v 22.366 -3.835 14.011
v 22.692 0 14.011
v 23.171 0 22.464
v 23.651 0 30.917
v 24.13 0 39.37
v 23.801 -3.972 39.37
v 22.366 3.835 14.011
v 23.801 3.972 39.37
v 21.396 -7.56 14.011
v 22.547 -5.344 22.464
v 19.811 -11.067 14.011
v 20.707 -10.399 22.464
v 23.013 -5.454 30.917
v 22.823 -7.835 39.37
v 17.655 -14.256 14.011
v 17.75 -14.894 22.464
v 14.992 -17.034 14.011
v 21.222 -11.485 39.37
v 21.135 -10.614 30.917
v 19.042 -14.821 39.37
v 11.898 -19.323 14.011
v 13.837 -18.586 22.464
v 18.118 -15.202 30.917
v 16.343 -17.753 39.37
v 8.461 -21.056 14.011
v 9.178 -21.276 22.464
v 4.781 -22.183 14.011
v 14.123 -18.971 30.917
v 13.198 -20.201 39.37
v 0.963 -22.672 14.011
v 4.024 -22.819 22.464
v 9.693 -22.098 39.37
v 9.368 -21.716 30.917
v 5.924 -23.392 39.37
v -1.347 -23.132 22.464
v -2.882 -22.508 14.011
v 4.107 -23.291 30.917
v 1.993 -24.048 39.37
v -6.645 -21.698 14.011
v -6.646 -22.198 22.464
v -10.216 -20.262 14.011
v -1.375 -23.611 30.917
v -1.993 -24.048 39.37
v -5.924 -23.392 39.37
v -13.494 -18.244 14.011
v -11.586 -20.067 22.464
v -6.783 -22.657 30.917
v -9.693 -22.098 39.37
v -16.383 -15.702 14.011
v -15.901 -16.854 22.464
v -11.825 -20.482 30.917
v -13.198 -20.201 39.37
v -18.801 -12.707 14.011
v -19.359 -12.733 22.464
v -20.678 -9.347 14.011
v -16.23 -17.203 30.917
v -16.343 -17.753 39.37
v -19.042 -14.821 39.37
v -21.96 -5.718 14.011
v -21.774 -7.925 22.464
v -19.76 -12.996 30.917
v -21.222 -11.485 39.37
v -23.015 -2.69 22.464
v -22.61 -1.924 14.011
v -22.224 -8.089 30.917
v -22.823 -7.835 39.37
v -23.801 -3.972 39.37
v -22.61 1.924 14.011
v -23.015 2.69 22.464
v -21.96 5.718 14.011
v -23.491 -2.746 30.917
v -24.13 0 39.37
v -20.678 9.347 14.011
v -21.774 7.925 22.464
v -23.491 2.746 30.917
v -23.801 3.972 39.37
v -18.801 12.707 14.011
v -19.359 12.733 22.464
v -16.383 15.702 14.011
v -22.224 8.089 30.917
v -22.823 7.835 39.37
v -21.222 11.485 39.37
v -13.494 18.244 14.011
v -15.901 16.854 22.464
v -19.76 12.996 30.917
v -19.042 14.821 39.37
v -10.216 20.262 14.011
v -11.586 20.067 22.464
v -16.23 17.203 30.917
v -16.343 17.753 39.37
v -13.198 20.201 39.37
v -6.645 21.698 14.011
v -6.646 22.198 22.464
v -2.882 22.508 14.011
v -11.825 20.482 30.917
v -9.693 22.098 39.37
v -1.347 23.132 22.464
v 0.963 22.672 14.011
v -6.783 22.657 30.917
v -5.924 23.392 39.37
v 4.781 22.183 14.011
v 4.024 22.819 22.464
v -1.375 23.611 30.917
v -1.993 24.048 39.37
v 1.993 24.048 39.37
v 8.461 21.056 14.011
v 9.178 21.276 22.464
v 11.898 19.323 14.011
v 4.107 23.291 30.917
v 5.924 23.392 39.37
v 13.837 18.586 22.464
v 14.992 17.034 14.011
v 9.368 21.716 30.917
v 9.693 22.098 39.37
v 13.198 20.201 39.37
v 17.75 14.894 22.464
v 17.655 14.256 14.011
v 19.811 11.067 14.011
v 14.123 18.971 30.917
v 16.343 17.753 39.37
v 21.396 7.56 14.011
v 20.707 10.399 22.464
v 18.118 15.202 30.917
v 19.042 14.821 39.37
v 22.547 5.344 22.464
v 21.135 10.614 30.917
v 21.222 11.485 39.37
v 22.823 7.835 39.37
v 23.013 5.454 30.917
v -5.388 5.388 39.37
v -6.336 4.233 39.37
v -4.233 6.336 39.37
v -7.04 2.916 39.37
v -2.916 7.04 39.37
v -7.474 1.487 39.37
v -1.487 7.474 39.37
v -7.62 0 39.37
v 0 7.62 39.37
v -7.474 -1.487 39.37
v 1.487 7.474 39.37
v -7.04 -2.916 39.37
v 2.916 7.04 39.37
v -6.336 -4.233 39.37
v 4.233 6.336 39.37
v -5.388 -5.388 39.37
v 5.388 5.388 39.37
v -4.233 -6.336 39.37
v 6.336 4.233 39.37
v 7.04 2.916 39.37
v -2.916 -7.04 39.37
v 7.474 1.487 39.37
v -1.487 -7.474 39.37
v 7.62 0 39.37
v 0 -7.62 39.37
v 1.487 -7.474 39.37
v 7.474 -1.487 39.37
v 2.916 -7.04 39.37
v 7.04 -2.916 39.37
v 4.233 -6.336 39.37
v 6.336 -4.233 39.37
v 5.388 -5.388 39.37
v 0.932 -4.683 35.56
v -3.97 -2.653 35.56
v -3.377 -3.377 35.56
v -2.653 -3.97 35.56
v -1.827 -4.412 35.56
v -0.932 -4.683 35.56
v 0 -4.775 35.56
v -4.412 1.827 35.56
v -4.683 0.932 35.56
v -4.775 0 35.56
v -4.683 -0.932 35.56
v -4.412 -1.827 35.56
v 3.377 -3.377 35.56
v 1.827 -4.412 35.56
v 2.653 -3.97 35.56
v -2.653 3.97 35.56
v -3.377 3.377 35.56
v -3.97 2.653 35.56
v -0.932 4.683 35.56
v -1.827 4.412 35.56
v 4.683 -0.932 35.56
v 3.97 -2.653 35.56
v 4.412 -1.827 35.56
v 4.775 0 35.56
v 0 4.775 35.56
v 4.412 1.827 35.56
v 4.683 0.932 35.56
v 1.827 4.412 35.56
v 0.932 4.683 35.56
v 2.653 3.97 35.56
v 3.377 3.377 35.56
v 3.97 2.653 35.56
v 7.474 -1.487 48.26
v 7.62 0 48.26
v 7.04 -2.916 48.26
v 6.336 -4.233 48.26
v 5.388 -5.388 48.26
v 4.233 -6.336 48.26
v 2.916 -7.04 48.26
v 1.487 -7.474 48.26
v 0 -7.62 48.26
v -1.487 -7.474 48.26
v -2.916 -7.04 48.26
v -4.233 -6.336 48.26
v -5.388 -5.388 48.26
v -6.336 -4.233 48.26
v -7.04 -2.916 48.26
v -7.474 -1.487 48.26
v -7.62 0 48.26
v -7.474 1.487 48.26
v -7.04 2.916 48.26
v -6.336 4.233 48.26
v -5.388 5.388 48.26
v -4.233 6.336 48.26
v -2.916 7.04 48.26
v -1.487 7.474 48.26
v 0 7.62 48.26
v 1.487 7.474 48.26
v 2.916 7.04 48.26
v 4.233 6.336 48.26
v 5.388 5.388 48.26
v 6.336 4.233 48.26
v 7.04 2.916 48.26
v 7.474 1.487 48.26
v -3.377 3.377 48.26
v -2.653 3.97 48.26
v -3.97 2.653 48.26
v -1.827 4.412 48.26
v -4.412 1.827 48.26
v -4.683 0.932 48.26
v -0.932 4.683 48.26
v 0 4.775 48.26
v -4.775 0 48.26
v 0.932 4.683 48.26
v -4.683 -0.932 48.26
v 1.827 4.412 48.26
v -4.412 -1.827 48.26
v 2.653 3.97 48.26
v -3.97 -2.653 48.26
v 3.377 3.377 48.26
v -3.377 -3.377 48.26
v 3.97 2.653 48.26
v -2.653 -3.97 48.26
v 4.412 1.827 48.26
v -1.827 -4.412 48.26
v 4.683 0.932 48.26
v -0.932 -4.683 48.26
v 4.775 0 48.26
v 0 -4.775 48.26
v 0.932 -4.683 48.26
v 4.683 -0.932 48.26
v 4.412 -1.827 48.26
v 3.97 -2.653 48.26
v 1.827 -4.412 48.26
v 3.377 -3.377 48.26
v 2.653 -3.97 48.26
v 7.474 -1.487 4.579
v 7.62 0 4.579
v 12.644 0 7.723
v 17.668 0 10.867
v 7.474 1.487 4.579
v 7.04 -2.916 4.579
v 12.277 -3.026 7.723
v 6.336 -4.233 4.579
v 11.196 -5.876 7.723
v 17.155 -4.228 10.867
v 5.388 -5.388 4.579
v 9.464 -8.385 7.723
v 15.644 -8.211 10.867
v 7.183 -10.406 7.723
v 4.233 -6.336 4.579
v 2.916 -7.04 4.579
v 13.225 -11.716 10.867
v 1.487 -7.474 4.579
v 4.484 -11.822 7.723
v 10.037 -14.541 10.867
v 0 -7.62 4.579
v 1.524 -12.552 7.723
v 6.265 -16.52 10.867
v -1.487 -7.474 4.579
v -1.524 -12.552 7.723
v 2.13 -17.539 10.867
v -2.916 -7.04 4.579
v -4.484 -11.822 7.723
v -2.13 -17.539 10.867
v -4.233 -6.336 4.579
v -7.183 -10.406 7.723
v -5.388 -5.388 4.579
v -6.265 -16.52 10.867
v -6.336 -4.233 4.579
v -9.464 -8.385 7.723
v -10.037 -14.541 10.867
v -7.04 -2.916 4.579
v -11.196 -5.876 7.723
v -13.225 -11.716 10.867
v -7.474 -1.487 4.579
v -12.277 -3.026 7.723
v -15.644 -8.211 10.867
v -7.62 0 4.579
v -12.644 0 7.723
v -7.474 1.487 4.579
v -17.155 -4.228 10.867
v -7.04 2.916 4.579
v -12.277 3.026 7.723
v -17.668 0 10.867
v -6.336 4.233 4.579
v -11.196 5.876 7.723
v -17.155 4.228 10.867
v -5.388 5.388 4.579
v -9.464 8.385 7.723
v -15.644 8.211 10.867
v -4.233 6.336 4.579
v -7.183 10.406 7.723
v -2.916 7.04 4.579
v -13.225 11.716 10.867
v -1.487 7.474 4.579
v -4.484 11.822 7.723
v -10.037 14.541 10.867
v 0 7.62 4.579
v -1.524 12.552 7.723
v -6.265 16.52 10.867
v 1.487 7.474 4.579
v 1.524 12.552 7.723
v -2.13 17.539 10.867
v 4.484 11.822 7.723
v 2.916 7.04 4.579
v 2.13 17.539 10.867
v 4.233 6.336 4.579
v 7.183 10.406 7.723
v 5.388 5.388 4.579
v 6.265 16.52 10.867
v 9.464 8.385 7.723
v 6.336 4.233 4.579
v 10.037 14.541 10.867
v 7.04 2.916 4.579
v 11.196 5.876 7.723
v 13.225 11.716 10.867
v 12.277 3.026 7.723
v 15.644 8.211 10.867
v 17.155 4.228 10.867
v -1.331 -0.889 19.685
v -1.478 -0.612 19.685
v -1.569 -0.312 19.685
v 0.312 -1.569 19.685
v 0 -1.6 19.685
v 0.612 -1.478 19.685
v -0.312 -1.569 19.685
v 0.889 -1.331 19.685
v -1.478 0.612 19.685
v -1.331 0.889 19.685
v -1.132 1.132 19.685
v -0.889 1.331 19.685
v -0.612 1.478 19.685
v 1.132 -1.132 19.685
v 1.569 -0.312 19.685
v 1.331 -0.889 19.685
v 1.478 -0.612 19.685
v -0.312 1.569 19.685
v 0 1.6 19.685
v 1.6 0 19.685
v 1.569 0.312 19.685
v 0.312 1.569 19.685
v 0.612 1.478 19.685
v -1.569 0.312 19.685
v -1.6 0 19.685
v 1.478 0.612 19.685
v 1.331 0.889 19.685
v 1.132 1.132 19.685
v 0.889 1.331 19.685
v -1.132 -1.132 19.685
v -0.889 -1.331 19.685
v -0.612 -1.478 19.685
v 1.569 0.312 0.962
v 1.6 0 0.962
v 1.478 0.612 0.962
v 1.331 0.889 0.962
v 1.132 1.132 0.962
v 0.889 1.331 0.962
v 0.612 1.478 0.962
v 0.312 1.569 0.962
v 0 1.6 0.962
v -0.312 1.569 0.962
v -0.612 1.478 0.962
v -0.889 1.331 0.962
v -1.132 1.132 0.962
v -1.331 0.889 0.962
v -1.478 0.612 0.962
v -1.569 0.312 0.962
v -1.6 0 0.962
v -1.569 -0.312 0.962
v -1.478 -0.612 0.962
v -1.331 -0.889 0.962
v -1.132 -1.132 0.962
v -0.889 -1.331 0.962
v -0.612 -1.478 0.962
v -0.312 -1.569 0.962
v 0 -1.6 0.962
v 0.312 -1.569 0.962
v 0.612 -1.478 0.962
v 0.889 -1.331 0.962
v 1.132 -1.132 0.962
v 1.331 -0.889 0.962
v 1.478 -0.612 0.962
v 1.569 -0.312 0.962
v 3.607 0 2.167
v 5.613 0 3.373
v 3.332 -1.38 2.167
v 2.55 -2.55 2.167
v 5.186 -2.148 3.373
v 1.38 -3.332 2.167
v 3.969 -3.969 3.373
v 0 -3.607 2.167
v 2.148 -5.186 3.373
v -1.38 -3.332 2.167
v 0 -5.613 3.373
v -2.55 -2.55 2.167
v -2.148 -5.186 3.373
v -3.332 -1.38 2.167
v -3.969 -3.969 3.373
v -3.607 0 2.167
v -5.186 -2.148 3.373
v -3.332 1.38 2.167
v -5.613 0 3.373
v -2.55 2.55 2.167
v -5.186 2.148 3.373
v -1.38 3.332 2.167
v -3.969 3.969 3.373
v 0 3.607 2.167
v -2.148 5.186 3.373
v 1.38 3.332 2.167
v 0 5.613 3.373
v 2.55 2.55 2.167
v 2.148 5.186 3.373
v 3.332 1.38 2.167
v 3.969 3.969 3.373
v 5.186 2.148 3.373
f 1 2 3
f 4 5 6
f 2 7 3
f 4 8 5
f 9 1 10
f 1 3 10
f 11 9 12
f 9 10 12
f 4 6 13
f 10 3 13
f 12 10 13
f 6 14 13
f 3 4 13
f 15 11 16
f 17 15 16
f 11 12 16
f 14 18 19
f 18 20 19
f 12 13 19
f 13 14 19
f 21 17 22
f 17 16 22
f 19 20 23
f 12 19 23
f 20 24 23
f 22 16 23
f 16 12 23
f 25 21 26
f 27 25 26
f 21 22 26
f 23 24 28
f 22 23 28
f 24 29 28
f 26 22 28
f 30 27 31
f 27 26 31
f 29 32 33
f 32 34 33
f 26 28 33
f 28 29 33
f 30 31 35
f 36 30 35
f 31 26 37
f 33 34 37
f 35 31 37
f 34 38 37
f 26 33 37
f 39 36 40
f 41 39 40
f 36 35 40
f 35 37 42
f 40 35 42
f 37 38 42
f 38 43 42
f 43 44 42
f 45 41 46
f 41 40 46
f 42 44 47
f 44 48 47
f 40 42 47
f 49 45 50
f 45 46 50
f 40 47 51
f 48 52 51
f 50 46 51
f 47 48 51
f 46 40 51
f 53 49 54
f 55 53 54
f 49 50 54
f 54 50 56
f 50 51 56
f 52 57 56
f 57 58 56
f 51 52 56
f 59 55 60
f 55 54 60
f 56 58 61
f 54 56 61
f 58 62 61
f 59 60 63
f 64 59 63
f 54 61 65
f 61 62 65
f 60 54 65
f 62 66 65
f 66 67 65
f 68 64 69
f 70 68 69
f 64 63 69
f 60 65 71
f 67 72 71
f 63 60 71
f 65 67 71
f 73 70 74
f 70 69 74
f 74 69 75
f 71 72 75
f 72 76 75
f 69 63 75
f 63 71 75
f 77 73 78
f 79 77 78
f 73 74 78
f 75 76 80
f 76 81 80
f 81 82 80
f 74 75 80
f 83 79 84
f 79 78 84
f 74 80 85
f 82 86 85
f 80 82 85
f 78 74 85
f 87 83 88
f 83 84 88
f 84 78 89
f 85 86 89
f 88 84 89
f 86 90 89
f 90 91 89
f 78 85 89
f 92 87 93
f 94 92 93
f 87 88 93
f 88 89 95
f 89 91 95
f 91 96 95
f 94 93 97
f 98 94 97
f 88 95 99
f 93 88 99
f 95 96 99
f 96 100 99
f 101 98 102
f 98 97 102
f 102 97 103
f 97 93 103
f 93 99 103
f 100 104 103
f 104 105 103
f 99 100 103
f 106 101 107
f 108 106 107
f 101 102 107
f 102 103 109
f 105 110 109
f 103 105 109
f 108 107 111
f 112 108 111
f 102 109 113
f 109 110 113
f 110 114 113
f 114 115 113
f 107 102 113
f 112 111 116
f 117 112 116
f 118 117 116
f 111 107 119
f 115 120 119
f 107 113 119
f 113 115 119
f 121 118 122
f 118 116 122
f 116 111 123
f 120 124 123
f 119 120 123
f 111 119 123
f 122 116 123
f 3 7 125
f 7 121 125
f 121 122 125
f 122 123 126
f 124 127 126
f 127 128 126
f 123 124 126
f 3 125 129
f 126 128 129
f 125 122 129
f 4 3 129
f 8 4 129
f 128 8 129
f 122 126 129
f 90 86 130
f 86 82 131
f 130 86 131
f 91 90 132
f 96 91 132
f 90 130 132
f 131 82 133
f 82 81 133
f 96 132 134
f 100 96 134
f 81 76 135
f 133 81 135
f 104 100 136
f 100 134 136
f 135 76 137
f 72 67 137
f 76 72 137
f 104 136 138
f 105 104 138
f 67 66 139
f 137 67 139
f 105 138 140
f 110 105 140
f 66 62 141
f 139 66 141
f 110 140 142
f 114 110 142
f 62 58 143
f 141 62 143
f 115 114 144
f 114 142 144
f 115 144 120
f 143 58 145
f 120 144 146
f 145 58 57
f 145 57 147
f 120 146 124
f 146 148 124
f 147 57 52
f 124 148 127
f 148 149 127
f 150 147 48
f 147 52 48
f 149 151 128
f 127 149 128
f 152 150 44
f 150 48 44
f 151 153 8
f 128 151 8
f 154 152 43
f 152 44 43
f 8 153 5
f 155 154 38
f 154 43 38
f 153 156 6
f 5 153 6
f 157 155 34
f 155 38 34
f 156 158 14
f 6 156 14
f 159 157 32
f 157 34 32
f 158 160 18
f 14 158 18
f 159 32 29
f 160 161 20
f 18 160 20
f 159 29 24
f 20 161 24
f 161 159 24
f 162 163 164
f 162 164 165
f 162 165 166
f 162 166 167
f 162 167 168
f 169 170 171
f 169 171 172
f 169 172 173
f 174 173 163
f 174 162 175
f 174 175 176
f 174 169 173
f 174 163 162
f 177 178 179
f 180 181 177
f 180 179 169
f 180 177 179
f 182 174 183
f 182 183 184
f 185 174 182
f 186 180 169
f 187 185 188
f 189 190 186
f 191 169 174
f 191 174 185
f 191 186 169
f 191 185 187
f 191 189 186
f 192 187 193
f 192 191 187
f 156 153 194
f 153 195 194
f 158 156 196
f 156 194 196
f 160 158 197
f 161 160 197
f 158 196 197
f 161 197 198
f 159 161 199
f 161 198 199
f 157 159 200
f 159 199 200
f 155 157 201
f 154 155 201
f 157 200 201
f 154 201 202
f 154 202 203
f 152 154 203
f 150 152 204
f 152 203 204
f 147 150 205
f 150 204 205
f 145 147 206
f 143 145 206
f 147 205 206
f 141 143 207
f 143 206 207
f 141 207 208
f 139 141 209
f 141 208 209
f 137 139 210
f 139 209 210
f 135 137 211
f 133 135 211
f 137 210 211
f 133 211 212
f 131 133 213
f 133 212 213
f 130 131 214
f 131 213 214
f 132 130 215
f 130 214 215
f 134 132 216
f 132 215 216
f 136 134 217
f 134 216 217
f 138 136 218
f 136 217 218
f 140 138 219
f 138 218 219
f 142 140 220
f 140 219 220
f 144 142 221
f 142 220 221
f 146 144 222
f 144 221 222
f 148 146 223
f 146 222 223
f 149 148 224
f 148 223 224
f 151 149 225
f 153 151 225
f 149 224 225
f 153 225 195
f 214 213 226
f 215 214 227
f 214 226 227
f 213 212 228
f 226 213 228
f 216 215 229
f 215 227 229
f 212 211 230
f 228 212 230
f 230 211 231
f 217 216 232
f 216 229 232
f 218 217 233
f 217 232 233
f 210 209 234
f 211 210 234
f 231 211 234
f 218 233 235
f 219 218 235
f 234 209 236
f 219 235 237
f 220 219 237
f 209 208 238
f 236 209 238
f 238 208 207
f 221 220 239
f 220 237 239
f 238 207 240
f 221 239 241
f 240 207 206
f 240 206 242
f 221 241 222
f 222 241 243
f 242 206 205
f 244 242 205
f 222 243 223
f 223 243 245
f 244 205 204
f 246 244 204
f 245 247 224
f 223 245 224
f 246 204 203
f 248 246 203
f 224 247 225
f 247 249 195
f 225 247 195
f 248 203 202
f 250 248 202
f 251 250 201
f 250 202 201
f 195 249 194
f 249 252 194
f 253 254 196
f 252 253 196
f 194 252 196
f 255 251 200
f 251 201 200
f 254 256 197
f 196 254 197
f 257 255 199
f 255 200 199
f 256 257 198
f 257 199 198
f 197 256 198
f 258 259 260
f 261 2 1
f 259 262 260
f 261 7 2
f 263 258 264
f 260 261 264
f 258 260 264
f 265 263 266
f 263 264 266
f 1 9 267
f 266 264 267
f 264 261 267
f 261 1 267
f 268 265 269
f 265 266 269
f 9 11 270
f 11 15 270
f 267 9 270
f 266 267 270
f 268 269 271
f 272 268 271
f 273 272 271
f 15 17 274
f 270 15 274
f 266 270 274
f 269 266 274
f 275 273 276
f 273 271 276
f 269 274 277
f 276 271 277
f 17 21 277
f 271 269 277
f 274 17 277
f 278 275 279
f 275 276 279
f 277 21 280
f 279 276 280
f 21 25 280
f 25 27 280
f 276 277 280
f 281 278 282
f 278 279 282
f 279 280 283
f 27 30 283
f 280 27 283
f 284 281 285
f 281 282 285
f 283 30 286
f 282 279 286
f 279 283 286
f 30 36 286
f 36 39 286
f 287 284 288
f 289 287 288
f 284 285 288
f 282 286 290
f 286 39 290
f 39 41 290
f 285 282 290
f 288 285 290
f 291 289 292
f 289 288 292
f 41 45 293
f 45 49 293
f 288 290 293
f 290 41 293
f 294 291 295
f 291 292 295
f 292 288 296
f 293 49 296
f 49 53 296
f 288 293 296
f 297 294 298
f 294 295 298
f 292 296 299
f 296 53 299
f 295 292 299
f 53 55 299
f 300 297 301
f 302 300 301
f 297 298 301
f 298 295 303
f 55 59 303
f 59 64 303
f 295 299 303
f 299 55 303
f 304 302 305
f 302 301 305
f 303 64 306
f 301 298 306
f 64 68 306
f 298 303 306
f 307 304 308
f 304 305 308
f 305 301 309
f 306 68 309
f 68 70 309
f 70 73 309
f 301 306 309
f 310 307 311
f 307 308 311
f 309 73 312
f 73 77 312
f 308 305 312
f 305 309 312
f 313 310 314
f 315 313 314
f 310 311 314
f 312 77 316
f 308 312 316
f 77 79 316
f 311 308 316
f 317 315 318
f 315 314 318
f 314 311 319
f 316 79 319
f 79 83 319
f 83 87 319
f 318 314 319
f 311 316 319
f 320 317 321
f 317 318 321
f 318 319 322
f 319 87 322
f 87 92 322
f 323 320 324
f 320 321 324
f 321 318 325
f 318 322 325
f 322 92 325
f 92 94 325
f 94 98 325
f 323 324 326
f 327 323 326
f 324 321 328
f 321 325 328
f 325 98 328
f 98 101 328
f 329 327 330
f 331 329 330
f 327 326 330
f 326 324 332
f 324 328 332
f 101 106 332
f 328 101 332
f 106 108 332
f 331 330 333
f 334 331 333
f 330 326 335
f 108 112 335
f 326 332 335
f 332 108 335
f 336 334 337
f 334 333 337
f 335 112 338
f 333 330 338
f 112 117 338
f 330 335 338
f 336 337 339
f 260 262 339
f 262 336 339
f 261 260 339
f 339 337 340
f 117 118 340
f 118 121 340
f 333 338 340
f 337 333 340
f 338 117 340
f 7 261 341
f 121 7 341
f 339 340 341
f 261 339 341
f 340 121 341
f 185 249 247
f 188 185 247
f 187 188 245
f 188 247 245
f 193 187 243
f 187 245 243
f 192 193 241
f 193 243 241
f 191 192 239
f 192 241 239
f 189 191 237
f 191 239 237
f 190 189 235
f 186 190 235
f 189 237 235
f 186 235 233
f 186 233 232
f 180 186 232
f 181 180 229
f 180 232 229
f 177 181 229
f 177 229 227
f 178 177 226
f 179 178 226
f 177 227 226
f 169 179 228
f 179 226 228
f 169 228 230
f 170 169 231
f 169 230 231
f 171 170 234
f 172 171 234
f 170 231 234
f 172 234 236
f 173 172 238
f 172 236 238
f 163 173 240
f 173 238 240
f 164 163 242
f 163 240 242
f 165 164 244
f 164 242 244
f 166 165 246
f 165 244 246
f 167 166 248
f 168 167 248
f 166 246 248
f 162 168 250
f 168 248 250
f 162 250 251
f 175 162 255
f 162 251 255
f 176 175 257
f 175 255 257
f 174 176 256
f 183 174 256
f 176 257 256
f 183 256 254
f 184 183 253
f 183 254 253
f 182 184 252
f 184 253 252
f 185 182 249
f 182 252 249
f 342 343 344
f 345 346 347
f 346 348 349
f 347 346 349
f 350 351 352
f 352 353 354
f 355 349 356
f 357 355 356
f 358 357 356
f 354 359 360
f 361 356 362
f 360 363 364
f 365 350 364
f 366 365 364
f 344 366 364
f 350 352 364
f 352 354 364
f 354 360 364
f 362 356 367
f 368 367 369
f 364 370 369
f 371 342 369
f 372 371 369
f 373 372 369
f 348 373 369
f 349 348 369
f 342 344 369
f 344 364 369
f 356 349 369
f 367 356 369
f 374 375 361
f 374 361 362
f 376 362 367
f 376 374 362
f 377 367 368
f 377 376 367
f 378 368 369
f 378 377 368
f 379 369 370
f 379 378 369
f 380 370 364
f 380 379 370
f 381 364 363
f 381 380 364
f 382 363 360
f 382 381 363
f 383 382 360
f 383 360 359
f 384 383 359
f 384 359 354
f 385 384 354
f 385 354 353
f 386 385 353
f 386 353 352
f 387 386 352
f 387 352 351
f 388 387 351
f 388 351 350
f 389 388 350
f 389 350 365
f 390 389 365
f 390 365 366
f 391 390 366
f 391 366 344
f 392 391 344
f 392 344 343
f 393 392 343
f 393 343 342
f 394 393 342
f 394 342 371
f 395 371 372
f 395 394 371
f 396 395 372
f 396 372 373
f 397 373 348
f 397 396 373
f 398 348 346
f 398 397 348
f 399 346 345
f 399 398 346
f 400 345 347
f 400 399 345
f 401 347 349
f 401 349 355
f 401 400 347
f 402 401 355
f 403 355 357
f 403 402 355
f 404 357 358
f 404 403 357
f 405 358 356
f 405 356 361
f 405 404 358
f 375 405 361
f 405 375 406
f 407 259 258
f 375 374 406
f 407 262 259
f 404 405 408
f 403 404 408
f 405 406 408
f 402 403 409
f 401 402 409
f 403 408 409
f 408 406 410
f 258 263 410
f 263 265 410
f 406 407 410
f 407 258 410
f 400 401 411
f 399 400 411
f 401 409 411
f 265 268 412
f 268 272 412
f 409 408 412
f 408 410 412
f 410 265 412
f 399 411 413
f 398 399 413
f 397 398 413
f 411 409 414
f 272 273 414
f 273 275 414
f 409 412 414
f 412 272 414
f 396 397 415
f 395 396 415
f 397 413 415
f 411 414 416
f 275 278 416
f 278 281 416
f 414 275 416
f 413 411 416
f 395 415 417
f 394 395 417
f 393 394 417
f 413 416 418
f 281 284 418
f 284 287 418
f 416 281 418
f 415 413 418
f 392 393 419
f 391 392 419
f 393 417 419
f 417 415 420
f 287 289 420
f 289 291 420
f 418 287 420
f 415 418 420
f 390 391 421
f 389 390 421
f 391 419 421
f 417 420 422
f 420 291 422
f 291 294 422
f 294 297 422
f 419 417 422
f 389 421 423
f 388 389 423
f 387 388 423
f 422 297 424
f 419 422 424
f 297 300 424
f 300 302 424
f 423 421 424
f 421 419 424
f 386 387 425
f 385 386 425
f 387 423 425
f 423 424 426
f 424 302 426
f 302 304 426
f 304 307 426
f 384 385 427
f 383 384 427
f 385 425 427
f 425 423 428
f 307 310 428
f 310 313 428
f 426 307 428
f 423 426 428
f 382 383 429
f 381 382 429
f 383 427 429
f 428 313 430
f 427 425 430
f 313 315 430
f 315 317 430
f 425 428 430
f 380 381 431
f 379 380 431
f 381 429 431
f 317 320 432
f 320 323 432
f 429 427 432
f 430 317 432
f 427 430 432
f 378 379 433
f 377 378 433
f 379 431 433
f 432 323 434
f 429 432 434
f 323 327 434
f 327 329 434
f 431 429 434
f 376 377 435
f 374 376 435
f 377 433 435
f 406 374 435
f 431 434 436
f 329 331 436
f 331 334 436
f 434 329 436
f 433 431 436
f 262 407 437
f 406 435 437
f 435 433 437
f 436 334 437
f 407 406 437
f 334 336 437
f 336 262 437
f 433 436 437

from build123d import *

# Parameters (mm, degrees)
F2_R     = 4.7752
F3_DEPTH = 12.7
F4_R     = 1.6002
F5_DEPTH = 19.685


with BuildPart() as f1:
    # F0 (on Front) → F1 (revolve)
    with BuildSketch(Plane.XZ):
        Polygon((0, 48.26), (0, 0), (7.62, 4.57905), (22.692223, 14.010726), (24.13, 39.37), (7.62, 39.37), (7.62, 48.26), align=None)
    revolve(axis=Axis((0, 0, 24.13), (0, 0, -1)))

    # F2 (on face) → F3 (cut)
    with BuildSketch(Plane.XY.offset(48.26)):
        Circle(F2_R)
    extrude(amount=-F3_DEPTH, mode=Mode.SUBTRACT)

    # F4 (on Top) → F5 (cut)
    with BuildSketch(Plane.XY):
        Circle(F4_R)
    extrude(amount=F5_DEPTH, mode=Mode.SUBTRACT)


solid = f1.part
